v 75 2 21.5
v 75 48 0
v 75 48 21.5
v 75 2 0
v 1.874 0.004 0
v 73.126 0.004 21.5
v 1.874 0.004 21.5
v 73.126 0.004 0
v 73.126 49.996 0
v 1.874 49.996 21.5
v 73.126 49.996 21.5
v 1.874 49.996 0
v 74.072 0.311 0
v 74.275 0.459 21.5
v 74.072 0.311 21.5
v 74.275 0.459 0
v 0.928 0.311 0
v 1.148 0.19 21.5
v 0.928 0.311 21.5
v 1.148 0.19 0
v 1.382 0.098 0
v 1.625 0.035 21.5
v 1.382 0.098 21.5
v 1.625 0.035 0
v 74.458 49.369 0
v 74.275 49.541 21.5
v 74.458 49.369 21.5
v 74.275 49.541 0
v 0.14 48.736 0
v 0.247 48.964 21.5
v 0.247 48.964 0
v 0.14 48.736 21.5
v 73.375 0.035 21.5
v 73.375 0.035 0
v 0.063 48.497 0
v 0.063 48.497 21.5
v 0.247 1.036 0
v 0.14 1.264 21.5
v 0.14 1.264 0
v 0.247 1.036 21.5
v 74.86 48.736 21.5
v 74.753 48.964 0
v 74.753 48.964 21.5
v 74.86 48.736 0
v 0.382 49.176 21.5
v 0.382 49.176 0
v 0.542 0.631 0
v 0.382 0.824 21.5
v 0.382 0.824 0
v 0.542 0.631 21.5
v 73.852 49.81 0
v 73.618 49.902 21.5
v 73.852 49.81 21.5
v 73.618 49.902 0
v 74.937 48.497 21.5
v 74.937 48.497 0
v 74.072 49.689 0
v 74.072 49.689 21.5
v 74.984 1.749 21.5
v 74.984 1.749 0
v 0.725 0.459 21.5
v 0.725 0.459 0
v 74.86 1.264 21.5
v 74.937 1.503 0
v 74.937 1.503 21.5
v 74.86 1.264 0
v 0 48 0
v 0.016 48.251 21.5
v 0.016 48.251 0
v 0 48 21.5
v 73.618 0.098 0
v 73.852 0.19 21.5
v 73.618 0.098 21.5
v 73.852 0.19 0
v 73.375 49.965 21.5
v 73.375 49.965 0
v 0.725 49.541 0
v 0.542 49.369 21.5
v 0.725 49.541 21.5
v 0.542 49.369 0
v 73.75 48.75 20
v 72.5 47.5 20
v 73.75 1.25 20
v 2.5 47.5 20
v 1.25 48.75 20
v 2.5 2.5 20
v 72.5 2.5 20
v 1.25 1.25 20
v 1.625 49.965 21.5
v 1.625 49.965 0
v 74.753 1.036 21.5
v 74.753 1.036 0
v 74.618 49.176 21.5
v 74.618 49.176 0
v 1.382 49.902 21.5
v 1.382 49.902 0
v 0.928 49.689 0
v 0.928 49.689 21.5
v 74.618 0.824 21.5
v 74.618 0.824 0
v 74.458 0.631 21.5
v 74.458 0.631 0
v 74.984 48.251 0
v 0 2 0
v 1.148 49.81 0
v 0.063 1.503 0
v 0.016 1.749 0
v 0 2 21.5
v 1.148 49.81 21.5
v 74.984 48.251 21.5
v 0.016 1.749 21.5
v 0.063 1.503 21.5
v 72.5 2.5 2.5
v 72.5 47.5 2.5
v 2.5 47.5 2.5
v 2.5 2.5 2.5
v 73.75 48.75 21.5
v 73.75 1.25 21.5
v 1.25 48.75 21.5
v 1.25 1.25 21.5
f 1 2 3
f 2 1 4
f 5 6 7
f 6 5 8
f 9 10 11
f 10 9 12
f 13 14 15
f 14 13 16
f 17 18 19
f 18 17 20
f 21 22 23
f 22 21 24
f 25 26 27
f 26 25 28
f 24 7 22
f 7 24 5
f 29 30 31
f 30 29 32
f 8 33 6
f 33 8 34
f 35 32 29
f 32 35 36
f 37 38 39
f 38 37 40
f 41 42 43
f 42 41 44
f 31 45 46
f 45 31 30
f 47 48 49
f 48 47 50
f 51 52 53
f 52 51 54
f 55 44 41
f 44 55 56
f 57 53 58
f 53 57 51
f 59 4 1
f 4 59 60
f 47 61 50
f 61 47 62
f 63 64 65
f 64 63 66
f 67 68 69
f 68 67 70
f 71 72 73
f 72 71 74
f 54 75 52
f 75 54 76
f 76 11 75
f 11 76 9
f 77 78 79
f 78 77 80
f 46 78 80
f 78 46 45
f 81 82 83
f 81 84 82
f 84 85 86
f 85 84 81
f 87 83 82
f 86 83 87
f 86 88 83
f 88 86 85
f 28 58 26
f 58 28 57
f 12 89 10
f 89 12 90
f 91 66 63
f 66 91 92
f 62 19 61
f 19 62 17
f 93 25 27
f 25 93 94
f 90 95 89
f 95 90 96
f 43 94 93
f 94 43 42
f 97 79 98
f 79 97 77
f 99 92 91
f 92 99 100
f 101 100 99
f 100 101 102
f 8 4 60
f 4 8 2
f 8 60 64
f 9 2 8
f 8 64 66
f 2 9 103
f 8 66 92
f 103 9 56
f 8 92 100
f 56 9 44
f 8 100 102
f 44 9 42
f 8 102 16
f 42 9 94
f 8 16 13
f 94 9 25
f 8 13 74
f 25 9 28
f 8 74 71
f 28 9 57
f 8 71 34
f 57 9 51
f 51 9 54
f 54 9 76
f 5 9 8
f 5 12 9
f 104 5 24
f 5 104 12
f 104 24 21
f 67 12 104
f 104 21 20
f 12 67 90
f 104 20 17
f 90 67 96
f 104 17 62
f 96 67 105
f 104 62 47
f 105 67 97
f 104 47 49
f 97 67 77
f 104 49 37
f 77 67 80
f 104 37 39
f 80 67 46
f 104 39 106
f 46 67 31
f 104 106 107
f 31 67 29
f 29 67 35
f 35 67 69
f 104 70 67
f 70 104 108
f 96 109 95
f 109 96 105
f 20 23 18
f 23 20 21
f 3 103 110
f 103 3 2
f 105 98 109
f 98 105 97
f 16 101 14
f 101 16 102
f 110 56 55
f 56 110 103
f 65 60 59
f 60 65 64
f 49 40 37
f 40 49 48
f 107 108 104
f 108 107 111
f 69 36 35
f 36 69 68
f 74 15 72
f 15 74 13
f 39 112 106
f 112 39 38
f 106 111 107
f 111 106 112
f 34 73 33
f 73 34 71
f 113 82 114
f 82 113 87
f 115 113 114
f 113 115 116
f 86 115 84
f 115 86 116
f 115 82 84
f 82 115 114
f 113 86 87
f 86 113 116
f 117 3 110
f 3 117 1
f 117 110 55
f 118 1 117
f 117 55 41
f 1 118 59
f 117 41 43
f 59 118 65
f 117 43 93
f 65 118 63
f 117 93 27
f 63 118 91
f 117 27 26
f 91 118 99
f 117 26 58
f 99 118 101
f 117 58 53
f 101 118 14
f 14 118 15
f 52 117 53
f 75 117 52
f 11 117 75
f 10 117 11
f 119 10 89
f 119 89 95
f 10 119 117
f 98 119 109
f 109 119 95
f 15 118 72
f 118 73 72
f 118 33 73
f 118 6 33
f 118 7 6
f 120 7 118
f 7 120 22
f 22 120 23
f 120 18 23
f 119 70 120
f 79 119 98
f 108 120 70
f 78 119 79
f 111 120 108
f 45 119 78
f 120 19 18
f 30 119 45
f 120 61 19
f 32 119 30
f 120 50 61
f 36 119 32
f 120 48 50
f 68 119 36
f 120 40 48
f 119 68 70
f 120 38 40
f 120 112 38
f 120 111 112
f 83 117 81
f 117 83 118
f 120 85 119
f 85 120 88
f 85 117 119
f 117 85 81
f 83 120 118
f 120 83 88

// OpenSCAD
//  length
x = 75;
//  width
y = 50;
//  height
z = 20;
//  width wall
w = 2.5;
//  inner rim height
irim = 0;
//  outer rim height
orim = 1.5;
//  radius corners (must be >0)
r = 2;
   
module case();

union()
{

difference()
{
$fn=50;
    
    hull()
    {
        translate([x-r,y-r])cylinder(r=r,h=z);
        translate([r,y-r])cylinder(r=r,h=z);
        translate([x-r,r])cylinder(r=r,h=z);
        translate([r,r])cylinder(r=r,h=z);
    }

    translate([w,w,w])cube([x-2*w,y-2*w,z]);
} 

difference()
{
$fn=50;
    
    hull()
    {
        translate([x-r,y-r])cylinder(r=r,h=z+orim);
        translate([r,y-r])cylinder(r=r,h=z+orim);
        translate([x-r,r])cylinder(r=r,h=z+orim);
        translate([r,r])cylinder(r=r,h=z+orim);
    }

    translate([w/2,w/2,w])cube([x-w,y-w,z+orim]);
}
  
difference()
{
$fn=50;
    
    hull()
    {
        translate([x-(r+w/2),y-(r+w/2)])cylinder(r=r,h=z+irim);
        translate([r+w/2,y-(r+w/2)])cylinder(r=r,h=z+irim);
        translate([x-(r+w/2),r+w/2])cylinder(r=r,h=z+irim);
        translate([r+w/2,r+w/2])cylinder(r=r,h=z+irim);
    }

    translate([w,w,w])cube([x-2*w,y-2*w,z+irim]);
}

}
